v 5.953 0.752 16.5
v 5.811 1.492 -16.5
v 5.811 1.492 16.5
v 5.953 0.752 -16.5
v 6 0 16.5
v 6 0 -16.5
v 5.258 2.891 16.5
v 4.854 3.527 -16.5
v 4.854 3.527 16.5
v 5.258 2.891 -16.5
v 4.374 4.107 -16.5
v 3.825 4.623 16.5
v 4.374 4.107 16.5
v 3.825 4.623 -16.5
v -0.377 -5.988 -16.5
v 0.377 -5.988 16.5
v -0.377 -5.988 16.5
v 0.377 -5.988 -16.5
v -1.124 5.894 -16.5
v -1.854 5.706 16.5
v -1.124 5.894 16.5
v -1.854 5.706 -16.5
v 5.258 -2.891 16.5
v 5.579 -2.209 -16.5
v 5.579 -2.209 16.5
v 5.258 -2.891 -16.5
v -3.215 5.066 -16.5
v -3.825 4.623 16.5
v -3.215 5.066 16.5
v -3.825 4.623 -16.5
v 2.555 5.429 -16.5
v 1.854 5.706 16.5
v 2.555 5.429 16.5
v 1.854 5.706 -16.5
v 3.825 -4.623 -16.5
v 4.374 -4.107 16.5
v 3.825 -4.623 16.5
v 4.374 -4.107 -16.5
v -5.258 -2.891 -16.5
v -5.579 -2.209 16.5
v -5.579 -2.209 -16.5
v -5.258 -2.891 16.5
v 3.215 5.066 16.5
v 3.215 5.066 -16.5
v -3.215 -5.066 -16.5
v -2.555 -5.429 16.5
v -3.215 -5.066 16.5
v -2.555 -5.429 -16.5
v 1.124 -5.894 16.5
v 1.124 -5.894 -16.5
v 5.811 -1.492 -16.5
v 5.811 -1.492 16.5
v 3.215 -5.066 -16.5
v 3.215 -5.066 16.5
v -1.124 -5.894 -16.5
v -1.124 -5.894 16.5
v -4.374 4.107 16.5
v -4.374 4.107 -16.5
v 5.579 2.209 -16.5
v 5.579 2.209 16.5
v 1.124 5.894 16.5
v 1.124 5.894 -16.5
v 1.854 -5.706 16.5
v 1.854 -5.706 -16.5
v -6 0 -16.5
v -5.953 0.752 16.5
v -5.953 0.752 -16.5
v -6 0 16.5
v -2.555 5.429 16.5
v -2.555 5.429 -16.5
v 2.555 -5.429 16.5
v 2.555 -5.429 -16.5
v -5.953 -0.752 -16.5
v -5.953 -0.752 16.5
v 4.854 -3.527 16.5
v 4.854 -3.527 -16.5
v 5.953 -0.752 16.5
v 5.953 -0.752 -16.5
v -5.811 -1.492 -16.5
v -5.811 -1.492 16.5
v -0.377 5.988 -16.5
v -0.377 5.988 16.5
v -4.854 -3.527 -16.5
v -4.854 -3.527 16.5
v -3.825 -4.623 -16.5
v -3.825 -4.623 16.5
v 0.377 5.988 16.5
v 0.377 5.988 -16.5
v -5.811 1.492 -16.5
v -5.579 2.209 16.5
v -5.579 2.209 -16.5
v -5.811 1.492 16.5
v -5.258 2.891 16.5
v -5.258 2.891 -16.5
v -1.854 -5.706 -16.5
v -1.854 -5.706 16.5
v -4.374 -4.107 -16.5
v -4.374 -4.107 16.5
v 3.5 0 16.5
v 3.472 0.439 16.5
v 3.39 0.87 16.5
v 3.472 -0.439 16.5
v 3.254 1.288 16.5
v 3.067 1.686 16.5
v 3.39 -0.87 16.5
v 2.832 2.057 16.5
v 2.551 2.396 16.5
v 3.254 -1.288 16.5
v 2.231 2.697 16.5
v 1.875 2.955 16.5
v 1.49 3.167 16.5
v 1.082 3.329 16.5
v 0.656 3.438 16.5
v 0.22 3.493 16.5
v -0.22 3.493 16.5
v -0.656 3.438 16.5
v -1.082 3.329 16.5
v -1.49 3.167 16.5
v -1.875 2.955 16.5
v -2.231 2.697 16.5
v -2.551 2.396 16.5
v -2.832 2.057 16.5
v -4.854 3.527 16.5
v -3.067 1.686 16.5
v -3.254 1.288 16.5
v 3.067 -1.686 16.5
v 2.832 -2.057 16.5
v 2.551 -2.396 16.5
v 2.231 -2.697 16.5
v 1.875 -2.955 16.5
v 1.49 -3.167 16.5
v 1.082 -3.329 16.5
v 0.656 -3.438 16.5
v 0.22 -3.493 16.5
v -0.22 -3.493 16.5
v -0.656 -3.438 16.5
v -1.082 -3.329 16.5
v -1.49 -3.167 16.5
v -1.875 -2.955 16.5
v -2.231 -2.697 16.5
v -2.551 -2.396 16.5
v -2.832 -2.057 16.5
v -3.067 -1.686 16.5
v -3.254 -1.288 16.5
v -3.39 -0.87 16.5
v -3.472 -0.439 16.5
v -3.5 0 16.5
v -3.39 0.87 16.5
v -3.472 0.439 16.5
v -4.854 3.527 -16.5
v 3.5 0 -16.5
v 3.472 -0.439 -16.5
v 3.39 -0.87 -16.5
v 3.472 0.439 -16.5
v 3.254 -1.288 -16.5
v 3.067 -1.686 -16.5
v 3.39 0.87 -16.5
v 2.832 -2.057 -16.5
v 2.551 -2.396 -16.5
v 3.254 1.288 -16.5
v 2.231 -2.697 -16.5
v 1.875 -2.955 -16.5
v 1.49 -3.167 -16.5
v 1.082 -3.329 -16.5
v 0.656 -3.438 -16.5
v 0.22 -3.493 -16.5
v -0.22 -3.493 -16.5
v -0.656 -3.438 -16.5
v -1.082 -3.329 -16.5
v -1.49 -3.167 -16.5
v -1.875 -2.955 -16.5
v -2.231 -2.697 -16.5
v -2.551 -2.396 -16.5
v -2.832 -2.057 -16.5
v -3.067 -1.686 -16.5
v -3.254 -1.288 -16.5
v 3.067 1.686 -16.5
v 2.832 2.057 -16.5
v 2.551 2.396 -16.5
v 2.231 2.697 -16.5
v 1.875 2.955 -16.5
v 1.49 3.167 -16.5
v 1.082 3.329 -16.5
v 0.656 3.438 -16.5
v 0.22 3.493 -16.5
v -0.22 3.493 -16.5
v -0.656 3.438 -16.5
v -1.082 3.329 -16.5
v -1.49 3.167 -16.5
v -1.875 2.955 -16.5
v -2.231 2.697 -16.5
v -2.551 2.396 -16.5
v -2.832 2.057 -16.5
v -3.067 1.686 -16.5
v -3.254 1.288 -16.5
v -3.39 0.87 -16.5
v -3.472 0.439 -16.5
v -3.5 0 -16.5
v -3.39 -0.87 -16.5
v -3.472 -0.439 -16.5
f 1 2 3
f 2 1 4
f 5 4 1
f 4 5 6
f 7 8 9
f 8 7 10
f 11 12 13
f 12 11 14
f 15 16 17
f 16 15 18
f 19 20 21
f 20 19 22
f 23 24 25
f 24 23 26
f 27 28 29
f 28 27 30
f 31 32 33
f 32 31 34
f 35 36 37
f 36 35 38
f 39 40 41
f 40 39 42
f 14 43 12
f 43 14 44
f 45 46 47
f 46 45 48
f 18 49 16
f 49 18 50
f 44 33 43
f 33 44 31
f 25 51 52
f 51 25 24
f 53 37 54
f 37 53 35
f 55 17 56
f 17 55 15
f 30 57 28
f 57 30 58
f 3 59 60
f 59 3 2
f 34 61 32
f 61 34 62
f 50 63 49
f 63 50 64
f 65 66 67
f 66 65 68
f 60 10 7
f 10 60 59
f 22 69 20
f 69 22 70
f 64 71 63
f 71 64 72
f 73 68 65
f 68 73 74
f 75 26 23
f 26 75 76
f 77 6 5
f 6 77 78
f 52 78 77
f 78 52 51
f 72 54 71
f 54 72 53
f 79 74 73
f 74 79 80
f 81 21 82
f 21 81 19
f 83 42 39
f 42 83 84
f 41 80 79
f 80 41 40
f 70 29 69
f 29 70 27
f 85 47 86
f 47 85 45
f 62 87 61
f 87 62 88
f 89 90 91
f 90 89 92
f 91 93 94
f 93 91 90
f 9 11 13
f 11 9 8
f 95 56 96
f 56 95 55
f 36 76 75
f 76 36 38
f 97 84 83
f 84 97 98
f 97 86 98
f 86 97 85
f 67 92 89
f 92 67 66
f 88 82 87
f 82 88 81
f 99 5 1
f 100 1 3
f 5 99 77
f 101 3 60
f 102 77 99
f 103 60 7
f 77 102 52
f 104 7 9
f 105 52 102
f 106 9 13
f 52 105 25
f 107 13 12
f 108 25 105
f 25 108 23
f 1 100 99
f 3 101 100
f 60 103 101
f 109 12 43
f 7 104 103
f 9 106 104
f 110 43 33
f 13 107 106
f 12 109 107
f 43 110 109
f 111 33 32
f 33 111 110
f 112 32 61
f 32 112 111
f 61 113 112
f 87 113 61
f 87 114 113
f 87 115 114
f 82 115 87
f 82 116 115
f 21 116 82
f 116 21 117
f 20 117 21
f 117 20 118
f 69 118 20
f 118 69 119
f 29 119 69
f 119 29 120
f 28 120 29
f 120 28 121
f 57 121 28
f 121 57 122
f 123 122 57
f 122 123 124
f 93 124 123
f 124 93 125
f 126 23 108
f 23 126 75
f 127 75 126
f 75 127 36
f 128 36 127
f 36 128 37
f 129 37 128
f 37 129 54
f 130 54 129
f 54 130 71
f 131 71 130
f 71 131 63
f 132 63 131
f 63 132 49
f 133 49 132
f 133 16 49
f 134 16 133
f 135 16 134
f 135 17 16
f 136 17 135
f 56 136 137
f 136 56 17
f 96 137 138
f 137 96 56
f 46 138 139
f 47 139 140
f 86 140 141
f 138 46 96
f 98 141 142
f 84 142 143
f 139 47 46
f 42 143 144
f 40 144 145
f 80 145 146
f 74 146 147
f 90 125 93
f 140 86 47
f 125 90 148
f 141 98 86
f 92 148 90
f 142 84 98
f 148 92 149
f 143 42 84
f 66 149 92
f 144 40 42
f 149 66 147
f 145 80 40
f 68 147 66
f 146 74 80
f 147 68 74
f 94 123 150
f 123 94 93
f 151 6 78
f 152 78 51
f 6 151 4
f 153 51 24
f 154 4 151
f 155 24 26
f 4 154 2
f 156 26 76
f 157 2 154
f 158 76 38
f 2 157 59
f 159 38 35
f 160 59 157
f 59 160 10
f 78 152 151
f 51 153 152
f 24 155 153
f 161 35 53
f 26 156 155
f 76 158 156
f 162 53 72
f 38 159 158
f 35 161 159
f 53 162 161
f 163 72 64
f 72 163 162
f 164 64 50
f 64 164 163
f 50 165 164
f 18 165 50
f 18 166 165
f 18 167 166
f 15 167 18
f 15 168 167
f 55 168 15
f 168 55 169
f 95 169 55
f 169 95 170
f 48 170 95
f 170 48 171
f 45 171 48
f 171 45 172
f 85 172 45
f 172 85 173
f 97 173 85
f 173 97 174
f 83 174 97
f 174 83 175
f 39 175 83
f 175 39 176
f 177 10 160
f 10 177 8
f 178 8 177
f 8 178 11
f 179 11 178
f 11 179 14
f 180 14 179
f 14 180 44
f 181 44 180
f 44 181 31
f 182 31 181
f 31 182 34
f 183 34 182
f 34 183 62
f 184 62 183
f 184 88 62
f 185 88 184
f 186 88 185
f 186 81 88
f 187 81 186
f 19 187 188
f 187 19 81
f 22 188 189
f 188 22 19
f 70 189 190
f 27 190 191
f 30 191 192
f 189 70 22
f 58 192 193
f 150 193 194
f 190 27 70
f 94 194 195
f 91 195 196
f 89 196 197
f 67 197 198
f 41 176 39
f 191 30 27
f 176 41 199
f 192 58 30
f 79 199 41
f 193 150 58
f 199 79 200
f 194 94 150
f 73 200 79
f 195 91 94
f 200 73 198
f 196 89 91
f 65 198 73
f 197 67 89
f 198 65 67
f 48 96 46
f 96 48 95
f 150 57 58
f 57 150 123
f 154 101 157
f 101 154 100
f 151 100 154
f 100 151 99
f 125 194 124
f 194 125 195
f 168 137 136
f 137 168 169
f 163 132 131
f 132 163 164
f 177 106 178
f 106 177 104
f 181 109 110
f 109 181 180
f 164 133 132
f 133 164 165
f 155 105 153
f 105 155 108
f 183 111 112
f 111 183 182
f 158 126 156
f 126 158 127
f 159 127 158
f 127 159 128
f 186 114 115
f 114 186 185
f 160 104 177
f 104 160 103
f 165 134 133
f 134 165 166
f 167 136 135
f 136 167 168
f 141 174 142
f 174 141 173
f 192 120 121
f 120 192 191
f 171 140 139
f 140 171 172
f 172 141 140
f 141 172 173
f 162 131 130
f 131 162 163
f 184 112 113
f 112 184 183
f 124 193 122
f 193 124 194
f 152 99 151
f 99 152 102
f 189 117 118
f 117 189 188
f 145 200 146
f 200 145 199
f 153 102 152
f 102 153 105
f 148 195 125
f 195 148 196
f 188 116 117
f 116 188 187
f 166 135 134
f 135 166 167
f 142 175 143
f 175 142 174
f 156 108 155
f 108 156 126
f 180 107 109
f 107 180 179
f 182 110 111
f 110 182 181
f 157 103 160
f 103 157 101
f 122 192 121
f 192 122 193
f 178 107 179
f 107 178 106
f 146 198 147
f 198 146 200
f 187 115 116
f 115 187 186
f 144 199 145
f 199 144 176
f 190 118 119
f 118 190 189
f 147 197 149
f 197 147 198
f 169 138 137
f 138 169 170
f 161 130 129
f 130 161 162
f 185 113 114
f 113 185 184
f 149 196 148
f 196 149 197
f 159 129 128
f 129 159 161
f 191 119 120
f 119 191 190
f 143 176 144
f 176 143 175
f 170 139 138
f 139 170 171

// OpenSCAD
$fn = 50;


difference() {
	union() {
		translate(v = [0, 0, -16.5000000000]) {
			cylinder(h = 33, r = 6.0000000000);
		}
	}
	union() {
		translate(v = [0, 0, -100.0000000000]) {
			cylinder(h = 200, r = 3.5000000000);
		}
	}
}
